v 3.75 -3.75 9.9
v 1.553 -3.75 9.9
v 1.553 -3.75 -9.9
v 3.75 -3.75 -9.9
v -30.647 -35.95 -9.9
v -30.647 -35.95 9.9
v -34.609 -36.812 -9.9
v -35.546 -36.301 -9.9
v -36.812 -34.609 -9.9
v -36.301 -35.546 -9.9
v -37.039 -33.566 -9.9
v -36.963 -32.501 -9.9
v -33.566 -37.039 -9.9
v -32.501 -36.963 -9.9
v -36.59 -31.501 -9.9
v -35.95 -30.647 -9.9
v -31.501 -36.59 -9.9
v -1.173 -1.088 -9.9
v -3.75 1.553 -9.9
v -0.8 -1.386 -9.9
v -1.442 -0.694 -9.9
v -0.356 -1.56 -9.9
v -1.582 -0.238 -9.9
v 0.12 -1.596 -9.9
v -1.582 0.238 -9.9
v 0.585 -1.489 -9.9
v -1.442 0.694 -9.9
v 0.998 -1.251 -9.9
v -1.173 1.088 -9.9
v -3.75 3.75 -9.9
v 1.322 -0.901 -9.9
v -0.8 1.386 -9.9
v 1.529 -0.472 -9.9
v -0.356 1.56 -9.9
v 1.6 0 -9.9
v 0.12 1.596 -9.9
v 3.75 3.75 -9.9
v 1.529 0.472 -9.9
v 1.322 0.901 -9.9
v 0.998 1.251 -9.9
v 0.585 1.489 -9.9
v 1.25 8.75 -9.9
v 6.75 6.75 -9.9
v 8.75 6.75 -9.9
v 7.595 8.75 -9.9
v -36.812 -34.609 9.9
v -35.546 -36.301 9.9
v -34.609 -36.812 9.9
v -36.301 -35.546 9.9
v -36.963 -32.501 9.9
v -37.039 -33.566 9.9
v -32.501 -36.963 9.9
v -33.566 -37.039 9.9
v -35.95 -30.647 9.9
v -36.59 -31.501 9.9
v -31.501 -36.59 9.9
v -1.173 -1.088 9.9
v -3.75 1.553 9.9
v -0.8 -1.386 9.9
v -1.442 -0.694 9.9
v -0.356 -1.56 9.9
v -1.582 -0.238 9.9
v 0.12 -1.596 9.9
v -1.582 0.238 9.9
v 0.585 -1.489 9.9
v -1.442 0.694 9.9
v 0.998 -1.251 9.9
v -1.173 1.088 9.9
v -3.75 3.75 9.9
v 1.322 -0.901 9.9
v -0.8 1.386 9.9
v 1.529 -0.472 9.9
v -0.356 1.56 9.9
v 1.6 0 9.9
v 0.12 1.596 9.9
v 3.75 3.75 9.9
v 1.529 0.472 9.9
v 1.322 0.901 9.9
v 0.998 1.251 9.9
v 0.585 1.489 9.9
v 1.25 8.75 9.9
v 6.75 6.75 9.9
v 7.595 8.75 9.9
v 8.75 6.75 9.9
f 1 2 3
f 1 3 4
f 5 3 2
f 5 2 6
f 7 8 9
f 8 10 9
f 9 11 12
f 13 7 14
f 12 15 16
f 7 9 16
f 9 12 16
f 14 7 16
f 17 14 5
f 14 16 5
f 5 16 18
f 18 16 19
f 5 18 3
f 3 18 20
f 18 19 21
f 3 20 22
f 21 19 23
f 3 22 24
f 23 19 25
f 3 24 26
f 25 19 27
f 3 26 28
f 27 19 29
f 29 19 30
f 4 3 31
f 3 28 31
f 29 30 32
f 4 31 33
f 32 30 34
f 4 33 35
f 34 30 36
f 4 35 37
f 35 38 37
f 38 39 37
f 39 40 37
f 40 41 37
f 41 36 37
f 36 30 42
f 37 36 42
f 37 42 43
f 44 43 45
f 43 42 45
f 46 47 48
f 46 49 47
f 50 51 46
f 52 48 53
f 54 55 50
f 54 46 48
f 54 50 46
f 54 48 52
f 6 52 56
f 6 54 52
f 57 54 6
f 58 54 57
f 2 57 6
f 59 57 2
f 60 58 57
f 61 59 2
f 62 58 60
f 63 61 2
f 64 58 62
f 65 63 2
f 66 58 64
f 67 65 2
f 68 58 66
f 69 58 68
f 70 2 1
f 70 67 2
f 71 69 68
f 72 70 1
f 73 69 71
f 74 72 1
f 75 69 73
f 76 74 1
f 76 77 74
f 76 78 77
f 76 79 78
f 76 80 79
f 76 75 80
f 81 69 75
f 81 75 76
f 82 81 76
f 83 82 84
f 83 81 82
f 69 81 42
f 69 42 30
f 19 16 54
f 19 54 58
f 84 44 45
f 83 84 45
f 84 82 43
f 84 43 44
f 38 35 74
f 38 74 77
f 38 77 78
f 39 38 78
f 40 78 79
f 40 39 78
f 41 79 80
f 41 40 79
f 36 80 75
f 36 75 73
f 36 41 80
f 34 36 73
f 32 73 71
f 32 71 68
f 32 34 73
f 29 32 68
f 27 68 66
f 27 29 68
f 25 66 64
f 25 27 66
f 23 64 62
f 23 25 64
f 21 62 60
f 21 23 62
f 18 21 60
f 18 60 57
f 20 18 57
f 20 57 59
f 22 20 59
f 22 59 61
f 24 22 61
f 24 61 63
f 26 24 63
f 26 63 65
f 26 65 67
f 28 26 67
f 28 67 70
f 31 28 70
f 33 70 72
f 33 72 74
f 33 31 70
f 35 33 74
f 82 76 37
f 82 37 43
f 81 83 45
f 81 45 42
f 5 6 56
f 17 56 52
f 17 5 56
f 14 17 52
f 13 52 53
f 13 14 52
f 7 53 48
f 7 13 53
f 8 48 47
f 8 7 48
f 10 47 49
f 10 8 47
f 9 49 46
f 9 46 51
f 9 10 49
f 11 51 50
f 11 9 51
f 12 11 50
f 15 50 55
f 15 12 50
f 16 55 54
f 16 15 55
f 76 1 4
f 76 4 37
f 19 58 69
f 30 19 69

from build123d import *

# Parameters (mm, degrees)
BOSS_EXTRUDE1_DEPTH      = 9.9
BOSS_EXTRUDE1_DEPTH_BACK = 9.9
SKETCH1_W                = 7.5
SKETCH1_H                = 7.5
SKETCH1_R                = 1.6
BOSS_EXTRUDE2_DEPTH      = 19.8
BOSS_EXTRUDE3_START      = -19.8
SKETCH3_R                = 1.6
BOSS_EXTRUDE3_DEPTH      = 19.8


with BuildPart() as part:
    # Sketch1 → Boss-Extrude1 (new, two sides: drawn at the far end of the back side and taken through both)
    with BuildSketch(Plane.XY.offset(-BOSS_EXTRUDE1_DEPTH_BACK)):
        Rectangle(SKETCH1_W, SKETCH1_H)
        Circle(SKETCH1_R, mode=Mode.SUBTRACT)
    extrude(amount=BOSS_EXTRUDE1_DEPTH + BOSS_EXTRUDE1_DEPTH_BACK)

    # Sketch2 → Boss-Extrude2 (add)
    with BuildSketch(Plane.XY.offset(9.9)):
        Polygon((3.75, 3.75), (6.75, 6.75), (8.75, 6.75), (7.595299462, 8.75), (1.25, 8.75), (-3.75, 3.75), align=None)
    extrude(amount=-BOSS_EXTRUDE2_DEPTH)

    # Sketch3 → Boss-Extrude3 (add)
    with BuildSketch(Plane.XY.offset(9.9).offset(BOSS_EXTRUDE3_START)):
        with BuildLine():
            Line((2.651650429, -2.651650429), (-30.646899338, -35.950200197))
            ThreePointArc((-30.646899338, -35.950200197), (-35.950200197, -35.950200197), (-35.950200197, -30.646899338))
            Line((-35.950200197, -30.646899338), (-2.651650429, 2.651650429))
            ThreePointArc((-2.651650429, 2.651650429), (2.651650429, 2.651650429), (2.651650429, -2.651650429))
        make_face()
        Circle(SKETCH3_R, mode=Mode.SUBTRACT)
    extrude(amount=BOSS_EXTRUDE3_DEPTH)


solid = part.part
